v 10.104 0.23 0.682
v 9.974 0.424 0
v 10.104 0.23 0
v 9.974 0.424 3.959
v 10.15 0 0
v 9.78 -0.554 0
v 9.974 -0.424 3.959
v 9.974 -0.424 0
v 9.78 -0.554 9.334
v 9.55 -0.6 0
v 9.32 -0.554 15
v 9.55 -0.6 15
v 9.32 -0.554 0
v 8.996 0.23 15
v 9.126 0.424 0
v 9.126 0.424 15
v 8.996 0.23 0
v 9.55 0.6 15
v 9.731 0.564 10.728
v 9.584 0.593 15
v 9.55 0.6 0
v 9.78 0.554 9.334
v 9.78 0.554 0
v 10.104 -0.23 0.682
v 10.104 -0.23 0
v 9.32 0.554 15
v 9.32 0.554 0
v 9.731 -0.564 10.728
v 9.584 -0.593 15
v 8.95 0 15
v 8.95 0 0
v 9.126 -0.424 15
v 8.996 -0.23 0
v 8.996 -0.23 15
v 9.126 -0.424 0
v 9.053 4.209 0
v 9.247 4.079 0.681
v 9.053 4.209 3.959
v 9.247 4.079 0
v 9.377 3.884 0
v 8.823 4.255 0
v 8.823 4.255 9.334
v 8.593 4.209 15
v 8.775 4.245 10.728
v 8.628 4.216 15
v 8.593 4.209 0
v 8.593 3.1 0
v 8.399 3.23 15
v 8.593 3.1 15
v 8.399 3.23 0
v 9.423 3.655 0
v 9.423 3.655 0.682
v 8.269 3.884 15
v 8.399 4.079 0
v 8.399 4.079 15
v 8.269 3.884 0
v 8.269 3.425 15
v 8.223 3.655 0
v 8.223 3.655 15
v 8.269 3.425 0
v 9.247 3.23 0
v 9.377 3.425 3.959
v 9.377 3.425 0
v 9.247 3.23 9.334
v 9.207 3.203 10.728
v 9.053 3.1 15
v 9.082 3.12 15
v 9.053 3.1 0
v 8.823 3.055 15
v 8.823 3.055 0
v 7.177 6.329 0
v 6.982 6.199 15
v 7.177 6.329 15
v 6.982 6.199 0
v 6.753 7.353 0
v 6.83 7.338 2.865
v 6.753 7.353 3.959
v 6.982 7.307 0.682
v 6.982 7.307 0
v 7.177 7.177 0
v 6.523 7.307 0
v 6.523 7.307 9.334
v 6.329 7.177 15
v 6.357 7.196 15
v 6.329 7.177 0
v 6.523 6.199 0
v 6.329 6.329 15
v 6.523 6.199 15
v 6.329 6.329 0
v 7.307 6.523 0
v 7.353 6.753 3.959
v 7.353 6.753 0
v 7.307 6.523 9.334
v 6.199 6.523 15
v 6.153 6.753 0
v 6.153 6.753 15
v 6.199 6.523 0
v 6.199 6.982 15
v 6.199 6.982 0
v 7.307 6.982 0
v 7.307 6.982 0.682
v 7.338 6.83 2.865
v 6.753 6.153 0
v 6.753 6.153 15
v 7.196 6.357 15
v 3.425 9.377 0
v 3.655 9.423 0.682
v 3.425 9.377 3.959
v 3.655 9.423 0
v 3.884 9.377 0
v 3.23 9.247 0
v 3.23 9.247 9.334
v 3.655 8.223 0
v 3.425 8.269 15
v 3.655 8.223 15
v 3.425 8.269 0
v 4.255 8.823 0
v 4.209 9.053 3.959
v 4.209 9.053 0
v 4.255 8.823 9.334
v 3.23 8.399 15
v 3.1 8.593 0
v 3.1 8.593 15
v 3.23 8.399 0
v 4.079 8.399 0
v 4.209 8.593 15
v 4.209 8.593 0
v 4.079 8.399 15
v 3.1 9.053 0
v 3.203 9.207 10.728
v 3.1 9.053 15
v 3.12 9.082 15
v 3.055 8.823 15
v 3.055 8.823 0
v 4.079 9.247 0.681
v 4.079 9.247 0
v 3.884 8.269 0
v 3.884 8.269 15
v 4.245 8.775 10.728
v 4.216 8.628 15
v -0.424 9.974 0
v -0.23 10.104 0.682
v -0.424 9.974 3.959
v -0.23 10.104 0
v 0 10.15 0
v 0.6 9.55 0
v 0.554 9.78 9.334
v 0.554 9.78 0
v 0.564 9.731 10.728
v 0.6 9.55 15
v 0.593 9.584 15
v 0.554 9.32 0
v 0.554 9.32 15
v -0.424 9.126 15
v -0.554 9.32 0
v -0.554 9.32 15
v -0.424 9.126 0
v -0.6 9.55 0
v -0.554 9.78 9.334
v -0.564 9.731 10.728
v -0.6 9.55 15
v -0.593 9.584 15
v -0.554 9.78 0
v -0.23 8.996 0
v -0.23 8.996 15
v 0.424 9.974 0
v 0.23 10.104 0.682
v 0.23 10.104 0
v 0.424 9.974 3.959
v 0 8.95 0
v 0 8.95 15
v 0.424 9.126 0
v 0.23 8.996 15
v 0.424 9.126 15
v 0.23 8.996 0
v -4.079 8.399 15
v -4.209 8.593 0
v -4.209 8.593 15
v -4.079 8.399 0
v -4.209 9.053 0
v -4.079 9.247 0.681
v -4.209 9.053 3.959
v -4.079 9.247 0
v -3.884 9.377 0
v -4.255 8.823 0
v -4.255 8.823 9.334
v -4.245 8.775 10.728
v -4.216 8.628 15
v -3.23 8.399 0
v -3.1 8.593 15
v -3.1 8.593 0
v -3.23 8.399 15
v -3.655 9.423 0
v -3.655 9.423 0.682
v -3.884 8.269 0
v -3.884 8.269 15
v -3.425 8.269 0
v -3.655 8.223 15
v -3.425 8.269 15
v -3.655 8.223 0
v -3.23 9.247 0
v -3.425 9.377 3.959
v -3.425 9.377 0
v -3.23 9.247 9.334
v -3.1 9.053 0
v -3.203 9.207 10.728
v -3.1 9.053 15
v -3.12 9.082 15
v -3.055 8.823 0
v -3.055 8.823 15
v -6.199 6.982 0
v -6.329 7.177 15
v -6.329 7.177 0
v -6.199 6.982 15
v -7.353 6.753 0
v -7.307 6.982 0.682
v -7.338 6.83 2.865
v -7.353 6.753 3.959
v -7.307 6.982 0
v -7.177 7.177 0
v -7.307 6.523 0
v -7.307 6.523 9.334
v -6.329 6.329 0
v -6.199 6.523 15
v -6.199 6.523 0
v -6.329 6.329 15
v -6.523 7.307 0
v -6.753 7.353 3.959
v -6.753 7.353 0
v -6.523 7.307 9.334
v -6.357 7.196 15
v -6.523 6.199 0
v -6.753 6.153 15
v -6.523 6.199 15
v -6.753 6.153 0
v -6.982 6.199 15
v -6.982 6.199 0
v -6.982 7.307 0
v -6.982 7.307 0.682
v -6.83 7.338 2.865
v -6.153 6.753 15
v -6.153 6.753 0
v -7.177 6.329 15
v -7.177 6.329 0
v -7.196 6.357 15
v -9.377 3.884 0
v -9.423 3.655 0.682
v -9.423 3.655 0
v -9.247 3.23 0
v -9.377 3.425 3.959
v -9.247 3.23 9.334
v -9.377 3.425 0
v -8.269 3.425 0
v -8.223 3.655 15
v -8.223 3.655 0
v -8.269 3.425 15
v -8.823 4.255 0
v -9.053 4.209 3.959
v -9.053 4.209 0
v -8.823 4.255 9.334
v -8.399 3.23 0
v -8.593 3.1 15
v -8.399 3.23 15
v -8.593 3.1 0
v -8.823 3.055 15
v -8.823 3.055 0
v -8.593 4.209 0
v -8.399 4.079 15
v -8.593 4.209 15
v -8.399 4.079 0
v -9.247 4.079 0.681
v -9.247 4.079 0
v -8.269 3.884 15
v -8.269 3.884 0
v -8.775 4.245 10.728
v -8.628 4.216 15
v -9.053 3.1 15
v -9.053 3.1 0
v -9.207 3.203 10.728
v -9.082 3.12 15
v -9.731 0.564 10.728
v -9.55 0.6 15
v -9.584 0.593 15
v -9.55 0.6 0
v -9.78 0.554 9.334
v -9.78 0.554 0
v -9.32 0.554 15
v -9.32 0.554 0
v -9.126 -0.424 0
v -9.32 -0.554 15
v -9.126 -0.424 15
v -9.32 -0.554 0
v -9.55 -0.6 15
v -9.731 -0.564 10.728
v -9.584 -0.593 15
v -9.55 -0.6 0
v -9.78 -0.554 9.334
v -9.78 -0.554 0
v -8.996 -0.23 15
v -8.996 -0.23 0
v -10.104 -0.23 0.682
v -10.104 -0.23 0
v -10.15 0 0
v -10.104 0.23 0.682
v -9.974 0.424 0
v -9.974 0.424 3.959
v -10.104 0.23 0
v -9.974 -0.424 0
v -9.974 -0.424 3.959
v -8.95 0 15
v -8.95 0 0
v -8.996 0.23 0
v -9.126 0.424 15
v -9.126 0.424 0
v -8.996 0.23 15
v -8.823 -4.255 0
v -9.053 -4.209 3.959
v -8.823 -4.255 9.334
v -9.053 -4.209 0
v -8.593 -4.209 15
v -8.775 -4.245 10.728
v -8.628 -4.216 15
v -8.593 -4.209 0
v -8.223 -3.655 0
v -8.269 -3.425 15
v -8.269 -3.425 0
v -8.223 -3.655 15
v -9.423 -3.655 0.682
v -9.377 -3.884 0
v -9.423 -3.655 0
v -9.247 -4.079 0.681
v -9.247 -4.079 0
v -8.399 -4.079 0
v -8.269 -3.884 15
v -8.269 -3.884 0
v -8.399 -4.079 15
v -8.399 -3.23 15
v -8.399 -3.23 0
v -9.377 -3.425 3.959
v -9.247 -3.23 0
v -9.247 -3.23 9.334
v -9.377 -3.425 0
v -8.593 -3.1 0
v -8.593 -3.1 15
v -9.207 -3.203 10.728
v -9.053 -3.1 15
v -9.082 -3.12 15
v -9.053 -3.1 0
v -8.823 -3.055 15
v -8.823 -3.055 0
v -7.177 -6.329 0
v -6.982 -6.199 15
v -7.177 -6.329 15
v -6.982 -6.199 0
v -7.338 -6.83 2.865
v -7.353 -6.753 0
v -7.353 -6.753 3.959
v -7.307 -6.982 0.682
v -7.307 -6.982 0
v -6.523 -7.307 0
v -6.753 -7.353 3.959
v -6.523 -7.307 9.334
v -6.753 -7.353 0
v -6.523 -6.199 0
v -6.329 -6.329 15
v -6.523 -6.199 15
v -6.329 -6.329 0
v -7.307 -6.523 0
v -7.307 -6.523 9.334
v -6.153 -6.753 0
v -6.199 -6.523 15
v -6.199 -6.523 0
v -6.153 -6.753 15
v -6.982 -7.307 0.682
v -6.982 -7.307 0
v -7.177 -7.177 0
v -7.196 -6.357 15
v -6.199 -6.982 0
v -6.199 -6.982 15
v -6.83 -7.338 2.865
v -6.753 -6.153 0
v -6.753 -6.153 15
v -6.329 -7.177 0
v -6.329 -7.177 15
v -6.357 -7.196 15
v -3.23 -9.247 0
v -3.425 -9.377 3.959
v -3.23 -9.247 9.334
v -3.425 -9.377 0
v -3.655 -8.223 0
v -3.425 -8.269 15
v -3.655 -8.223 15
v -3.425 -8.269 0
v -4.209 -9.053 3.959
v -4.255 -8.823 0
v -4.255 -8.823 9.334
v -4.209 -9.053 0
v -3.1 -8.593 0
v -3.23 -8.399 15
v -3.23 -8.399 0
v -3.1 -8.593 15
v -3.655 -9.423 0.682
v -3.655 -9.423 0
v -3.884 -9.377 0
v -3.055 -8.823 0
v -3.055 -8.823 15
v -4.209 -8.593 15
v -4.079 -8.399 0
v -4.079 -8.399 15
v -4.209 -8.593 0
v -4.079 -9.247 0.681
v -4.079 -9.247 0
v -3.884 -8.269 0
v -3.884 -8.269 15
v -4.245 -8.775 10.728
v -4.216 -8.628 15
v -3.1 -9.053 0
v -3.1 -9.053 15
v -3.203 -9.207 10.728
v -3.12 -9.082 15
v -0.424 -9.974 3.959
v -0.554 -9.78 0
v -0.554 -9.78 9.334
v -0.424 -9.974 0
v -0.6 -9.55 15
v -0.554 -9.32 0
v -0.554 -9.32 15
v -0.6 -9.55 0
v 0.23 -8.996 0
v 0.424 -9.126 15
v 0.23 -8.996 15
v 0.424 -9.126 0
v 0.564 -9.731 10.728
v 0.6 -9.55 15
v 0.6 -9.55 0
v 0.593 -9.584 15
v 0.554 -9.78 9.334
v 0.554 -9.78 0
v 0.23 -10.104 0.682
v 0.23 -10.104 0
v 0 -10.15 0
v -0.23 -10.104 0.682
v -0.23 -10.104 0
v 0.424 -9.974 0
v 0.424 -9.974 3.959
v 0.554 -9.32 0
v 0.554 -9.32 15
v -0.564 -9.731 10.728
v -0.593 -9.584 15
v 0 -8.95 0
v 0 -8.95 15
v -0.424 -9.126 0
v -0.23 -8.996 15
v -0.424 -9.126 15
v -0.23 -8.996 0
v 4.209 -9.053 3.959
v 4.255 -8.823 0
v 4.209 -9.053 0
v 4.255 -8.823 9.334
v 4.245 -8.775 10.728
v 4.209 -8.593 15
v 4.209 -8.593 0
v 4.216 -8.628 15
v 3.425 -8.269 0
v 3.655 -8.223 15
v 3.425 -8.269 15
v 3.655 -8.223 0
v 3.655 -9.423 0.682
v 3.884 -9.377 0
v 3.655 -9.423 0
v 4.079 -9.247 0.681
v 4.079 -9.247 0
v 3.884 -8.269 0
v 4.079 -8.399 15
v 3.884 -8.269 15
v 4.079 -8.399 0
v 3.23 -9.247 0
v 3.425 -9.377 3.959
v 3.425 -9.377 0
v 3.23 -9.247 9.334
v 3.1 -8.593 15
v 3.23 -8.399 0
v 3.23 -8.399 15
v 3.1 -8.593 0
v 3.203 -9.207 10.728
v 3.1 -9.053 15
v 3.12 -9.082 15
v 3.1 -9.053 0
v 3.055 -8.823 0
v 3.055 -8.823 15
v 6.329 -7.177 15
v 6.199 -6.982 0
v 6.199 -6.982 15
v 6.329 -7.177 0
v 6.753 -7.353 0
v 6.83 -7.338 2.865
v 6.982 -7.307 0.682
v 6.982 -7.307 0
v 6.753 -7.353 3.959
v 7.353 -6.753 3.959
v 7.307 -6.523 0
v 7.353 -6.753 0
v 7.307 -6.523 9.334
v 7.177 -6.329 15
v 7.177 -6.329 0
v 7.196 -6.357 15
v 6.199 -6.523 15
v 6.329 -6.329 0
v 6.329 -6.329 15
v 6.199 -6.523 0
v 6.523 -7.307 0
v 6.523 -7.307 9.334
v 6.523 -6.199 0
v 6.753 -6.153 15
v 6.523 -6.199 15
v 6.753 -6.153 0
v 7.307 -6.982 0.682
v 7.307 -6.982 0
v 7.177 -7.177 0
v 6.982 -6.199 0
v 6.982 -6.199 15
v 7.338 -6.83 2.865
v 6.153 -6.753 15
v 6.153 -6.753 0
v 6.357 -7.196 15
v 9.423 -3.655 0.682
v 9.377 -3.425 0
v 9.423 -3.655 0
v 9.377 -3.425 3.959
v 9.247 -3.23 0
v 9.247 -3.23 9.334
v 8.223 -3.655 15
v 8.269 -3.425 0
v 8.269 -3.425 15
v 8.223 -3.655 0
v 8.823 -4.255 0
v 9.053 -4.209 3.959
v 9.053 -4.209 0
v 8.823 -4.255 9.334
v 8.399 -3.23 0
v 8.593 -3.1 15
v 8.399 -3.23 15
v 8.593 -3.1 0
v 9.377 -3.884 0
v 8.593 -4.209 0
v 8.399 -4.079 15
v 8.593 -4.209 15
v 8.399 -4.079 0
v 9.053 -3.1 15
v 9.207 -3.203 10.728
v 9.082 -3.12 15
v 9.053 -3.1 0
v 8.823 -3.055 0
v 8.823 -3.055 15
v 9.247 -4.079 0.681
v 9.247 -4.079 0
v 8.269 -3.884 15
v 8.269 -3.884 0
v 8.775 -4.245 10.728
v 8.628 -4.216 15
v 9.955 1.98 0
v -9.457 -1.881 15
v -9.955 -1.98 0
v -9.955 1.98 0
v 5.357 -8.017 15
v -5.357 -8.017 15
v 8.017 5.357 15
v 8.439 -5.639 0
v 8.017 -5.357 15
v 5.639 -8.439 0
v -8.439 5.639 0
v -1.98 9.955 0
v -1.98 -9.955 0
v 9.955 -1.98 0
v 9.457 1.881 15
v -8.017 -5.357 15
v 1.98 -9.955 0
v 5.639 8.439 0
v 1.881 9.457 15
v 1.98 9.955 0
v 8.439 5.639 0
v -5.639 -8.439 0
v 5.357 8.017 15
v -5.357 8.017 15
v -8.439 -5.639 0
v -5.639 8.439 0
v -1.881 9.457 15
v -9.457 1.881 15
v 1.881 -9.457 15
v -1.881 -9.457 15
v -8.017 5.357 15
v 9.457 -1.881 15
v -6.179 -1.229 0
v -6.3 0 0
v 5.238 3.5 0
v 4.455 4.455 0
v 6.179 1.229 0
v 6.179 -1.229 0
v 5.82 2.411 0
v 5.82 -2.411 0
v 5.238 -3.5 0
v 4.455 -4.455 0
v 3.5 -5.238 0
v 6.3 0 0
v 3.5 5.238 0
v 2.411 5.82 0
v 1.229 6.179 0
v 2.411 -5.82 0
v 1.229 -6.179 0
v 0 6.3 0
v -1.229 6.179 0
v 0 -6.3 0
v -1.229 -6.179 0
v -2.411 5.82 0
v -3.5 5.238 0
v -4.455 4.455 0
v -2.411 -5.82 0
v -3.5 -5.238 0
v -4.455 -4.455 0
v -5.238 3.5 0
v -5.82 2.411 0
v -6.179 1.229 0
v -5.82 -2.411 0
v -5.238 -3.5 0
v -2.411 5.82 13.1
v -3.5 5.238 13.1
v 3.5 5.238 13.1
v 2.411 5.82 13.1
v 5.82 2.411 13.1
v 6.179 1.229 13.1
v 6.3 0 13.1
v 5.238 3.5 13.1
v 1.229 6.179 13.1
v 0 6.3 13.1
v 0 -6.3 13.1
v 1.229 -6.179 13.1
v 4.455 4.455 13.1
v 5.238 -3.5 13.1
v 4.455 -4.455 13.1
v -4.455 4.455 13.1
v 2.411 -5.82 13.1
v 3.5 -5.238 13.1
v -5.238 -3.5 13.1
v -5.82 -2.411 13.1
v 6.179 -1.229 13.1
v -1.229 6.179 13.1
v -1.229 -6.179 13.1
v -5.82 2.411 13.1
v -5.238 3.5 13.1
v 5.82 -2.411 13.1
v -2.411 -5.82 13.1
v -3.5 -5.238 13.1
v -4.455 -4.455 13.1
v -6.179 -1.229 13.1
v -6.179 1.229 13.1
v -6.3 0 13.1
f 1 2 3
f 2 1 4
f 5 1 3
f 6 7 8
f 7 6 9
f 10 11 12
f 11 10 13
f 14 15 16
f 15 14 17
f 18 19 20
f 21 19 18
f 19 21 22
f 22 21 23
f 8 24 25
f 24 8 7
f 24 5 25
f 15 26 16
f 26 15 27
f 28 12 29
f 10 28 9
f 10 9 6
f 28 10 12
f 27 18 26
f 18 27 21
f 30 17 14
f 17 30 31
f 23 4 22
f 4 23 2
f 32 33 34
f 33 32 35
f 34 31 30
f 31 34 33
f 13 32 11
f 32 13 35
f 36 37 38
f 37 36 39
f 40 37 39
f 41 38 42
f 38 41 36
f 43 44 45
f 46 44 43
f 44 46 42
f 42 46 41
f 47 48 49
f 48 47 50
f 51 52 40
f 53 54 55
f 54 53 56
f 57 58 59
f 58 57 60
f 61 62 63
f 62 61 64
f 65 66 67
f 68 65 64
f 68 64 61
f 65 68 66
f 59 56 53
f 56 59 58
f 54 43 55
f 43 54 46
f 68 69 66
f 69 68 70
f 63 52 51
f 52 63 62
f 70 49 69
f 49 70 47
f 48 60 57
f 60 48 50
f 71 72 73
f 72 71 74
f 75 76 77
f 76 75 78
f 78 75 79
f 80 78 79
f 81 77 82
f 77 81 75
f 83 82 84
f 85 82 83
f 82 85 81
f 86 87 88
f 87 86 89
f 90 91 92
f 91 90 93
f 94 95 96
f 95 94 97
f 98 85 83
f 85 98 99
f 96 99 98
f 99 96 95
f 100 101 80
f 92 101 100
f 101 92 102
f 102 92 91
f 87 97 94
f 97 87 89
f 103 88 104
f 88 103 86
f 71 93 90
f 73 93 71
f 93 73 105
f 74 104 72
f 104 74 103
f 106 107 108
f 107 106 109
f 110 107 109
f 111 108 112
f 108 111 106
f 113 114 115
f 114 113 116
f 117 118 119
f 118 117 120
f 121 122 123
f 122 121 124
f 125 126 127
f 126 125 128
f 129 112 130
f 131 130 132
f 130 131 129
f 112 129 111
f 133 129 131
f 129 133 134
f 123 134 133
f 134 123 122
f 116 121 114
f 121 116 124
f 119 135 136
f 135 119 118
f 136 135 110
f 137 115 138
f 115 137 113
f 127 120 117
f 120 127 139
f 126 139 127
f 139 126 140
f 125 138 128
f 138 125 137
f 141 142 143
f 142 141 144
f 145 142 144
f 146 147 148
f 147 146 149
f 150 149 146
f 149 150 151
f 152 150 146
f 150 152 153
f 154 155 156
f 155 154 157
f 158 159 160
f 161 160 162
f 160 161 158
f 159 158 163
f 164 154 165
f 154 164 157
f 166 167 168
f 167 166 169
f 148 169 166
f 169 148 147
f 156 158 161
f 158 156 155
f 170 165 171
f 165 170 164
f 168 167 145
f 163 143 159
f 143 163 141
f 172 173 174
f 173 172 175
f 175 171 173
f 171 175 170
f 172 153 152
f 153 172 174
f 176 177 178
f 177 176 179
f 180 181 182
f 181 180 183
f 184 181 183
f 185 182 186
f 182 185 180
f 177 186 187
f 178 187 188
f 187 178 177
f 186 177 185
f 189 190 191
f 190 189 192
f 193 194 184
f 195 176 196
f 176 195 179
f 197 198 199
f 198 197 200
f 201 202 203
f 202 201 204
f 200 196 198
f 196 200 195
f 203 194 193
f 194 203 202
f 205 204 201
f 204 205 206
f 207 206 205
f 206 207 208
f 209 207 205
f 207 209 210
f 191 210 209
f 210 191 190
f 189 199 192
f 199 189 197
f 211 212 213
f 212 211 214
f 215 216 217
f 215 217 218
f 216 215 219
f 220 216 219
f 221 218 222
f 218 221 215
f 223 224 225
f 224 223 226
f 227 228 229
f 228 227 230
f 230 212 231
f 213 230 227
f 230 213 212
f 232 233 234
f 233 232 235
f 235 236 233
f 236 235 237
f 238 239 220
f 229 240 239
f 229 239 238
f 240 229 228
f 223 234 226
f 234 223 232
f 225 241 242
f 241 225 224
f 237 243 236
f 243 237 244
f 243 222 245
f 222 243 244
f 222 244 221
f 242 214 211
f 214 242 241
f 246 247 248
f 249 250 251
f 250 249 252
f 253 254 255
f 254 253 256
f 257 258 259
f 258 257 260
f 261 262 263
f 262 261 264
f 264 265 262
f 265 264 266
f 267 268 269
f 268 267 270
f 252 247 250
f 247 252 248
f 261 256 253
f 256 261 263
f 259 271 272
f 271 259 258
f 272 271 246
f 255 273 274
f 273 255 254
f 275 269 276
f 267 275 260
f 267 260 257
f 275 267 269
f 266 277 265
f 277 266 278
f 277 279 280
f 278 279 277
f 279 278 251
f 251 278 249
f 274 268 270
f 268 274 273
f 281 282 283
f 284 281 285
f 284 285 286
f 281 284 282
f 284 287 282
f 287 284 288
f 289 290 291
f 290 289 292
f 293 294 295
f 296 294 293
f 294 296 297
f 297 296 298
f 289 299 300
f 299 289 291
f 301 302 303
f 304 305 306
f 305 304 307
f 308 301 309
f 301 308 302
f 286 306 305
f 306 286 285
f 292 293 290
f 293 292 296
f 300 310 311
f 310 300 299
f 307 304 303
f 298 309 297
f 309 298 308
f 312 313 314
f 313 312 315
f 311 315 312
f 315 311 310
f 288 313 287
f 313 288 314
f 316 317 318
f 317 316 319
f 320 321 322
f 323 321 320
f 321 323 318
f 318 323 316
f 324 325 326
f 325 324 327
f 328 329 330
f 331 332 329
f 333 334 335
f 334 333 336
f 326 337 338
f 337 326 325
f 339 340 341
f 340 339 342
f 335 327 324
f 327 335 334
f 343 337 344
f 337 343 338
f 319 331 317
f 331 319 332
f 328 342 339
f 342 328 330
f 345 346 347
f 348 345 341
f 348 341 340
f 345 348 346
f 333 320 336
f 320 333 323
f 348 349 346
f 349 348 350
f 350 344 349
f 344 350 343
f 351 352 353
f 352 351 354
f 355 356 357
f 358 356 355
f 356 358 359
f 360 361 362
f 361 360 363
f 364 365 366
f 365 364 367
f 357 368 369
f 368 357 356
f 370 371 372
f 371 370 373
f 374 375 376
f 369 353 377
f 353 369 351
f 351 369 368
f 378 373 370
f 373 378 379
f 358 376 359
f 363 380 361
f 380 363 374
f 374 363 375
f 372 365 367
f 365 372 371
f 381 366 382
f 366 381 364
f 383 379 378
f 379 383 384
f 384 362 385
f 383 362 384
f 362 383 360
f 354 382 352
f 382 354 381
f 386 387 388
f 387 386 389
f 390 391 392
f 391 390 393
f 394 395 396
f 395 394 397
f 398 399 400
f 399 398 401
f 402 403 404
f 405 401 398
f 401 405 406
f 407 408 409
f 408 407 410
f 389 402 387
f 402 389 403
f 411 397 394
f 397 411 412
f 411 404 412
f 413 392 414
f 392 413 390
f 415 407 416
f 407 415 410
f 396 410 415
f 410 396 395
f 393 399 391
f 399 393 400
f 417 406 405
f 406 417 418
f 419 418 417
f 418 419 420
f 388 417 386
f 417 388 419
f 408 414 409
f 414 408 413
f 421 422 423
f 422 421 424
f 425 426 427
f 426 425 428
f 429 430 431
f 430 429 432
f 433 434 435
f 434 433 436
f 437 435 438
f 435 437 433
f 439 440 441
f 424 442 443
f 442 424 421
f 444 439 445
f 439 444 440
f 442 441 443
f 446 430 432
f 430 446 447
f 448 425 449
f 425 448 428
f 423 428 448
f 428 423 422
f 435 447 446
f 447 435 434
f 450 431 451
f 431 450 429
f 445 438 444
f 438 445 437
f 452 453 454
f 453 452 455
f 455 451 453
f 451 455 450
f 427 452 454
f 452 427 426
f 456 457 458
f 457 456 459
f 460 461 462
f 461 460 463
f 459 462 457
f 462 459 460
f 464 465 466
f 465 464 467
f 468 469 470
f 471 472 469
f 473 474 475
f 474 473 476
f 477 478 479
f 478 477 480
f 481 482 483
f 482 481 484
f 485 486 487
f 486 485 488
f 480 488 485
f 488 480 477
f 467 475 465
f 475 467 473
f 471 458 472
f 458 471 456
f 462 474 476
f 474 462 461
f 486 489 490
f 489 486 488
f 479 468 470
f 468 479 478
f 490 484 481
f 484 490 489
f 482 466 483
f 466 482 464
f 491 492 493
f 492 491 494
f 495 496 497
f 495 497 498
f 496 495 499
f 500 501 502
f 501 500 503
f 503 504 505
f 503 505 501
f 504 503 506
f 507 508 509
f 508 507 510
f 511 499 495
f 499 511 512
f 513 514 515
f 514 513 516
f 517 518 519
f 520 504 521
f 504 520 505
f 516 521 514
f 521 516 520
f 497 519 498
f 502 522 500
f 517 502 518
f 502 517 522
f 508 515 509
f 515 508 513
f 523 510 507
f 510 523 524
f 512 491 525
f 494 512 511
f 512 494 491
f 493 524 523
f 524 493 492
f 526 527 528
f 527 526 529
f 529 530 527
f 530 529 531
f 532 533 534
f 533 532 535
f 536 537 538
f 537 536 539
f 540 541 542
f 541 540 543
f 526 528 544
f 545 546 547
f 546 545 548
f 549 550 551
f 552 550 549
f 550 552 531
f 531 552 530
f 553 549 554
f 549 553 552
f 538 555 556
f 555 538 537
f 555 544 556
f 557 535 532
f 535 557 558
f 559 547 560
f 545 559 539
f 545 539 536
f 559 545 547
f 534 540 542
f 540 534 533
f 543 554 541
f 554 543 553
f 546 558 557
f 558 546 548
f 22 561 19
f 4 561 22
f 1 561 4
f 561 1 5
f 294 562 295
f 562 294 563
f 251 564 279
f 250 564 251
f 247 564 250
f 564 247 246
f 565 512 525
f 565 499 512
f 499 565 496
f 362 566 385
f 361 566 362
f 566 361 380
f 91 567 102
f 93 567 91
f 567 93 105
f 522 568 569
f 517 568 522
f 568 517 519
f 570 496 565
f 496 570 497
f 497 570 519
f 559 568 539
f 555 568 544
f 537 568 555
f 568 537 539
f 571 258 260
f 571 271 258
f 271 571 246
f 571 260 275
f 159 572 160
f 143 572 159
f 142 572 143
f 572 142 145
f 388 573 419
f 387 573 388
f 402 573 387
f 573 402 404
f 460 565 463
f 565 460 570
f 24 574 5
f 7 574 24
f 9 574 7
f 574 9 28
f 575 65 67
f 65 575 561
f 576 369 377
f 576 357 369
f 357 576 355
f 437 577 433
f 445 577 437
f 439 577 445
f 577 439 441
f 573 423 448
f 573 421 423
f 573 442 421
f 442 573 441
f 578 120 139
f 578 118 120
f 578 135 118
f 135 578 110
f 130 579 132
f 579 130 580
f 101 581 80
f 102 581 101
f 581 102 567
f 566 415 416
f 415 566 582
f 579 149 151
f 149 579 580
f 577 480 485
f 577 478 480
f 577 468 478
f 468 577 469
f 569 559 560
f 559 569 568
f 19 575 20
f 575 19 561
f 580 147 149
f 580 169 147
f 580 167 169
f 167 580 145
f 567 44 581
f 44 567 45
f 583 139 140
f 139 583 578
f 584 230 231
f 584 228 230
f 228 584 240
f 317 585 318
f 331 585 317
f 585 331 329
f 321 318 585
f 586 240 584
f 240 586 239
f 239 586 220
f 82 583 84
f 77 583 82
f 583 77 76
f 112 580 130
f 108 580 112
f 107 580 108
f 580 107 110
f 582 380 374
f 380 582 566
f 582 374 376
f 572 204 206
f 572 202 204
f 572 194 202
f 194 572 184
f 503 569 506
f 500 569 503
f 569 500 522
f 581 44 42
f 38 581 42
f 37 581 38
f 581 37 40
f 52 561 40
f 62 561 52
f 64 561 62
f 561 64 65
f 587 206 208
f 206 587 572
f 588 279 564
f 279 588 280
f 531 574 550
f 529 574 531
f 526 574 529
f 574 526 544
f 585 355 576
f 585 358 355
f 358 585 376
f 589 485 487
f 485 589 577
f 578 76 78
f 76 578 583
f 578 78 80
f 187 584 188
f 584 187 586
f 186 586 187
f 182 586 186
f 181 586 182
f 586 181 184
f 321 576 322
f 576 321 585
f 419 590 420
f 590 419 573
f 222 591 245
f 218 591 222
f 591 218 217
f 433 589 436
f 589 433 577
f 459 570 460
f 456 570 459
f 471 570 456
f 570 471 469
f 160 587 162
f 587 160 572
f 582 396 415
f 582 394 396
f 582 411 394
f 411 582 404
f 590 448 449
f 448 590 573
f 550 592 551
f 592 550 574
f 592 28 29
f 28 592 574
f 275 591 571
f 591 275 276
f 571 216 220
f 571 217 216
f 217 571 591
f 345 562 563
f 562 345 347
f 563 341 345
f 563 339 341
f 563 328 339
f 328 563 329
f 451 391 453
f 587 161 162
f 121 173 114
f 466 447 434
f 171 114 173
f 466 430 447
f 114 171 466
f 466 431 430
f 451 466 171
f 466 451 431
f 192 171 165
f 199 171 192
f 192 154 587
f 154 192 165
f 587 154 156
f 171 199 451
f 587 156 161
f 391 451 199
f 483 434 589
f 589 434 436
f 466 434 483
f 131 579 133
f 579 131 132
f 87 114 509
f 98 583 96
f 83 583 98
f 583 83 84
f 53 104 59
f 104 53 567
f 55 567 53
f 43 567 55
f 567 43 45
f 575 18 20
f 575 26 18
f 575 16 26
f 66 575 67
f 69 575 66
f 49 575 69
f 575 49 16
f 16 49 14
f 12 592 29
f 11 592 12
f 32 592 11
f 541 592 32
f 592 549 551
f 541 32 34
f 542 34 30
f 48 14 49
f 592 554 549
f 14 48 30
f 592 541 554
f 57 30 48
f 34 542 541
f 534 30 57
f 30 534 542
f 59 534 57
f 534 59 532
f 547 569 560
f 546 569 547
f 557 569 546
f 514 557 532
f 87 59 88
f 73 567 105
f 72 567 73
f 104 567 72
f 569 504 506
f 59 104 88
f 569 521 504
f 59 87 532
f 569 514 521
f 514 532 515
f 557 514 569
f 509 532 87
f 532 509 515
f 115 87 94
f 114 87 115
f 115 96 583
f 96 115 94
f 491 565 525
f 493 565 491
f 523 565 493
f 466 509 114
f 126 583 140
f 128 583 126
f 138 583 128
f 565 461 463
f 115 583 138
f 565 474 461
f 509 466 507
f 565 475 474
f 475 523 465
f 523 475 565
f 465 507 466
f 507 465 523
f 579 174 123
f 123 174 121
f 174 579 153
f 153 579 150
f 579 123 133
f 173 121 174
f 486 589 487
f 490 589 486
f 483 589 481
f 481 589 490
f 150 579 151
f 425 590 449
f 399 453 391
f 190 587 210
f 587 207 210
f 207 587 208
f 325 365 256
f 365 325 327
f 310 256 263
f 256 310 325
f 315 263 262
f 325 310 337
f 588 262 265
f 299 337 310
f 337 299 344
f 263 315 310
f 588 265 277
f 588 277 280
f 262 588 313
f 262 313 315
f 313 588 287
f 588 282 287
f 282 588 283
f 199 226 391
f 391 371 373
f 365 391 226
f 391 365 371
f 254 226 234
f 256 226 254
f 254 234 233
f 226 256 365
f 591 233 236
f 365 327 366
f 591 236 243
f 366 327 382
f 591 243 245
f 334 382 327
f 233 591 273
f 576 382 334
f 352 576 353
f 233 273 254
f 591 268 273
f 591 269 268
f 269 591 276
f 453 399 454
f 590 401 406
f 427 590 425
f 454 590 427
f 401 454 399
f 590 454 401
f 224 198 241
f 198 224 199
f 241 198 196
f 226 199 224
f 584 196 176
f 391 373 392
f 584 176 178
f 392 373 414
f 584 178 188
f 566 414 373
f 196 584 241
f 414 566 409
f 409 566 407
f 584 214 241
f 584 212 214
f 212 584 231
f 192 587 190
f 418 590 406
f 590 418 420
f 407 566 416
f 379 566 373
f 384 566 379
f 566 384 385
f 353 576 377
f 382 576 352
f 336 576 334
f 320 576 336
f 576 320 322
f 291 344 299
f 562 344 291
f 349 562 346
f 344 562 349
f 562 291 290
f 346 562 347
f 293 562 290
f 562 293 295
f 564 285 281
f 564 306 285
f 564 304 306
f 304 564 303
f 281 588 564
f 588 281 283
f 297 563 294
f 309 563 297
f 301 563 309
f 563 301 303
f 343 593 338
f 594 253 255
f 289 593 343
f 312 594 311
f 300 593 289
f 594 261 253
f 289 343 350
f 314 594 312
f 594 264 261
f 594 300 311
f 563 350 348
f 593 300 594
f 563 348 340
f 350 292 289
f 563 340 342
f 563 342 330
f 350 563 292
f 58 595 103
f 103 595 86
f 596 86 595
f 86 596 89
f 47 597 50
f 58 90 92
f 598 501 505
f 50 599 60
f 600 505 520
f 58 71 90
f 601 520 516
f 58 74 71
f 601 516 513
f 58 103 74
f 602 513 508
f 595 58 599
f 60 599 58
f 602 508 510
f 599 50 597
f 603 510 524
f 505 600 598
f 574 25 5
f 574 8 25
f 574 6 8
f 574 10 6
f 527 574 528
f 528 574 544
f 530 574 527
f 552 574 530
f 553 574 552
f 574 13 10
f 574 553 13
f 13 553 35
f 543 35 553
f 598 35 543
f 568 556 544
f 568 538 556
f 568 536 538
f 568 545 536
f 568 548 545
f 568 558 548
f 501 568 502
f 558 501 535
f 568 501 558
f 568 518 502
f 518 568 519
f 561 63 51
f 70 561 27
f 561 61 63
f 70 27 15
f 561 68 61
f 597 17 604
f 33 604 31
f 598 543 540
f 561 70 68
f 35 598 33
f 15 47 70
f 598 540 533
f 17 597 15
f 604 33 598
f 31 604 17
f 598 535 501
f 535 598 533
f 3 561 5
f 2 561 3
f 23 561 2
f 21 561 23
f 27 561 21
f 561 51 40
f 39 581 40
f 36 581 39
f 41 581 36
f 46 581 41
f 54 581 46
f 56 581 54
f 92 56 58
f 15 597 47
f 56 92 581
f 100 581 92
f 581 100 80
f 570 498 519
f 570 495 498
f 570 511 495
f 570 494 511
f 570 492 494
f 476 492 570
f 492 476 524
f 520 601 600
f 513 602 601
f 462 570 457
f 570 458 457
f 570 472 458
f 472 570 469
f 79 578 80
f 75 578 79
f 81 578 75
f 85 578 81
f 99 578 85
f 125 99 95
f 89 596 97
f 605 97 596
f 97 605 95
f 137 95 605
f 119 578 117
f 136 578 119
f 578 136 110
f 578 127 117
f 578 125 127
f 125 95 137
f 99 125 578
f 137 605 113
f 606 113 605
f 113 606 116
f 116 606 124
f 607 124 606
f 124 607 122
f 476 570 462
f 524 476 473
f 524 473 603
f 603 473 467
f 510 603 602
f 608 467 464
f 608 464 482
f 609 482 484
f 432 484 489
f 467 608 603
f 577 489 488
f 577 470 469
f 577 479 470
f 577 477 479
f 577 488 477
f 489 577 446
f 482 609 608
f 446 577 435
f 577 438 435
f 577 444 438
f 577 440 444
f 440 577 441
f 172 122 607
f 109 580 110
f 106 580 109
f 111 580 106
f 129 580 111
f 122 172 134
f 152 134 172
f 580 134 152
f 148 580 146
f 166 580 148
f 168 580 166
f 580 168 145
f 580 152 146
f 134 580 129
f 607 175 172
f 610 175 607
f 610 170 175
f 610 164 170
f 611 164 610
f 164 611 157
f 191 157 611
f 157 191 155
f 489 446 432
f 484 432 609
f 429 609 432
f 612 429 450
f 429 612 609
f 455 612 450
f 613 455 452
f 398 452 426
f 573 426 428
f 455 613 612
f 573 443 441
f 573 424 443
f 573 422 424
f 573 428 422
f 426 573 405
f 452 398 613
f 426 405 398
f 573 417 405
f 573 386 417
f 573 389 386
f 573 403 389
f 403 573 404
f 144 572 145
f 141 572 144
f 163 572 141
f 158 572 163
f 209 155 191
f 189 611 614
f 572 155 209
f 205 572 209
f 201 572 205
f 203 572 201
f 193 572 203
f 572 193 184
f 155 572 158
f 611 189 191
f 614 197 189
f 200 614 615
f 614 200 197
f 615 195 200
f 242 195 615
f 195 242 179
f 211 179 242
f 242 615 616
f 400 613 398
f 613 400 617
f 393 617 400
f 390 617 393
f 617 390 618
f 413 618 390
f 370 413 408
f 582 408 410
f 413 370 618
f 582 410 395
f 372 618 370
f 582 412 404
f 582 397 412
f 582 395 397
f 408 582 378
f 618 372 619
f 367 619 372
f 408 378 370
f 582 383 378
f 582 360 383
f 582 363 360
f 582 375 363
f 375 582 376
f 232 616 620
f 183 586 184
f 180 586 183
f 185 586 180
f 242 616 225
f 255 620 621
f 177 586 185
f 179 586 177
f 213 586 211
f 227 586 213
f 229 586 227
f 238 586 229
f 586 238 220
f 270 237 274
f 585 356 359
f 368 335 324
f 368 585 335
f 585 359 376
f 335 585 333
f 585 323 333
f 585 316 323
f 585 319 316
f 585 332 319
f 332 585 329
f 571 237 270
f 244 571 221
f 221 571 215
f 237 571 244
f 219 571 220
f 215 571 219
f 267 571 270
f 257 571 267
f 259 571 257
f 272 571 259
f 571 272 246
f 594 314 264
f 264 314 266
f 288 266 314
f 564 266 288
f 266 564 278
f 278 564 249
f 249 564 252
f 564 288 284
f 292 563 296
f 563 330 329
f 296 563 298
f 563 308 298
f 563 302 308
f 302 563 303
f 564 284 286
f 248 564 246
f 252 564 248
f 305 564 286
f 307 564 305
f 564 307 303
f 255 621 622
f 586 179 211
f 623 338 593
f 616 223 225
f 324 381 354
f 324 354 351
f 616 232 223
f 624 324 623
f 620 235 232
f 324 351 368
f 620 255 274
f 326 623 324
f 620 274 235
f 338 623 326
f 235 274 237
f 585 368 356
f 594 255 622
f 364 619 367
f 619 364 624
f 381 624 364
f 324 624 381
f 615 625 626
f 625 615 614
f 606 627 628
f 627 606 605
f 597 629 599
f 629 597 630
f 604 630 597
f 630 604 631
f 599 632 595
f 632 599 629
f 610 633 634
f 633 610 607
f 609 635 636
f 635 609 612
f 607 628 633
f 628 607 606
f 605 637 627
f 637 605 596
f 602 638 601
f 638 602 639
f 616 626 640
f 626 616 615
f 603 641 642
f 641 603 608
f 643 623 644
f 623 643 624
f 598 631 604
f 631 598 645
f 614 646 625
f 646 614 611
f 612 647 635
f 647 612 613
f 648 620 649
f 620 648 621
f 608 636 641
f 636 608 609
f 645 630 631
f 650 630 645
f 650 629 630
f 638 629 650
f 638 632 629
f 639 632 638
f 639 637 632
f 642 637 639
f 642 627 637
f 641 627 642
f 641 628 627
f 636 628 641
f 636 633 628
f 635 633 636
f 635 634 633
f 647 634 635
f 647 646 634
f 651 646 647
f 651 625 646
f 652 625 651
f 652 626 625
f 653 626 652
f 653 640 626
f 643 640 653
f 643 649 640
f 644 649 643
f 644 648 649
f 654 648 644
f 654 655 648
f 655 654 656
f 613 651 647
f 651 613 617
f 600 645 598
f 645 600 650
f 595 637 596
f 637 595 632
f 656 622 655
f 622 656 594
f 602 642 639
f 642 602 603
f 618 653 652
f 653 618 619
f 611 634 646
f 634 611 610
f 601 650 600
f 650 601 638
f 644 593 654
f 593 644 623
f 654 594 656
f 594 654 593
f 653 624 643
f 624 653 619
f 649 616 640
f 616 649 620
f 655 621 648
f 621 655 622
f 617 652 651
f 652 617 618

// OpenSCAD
// ACCESS KNOB — Elektron Machinedrum / Monomachine Master & Vol Knob (Slip-On Sleeve)
// Generated via CLI for Studio Knobs (Slip-On Sleeve)
module access_knob_elektron_master_slipon() {
  outer_d = 20.3;
  height = 15;
  taper = 0.95;
  bore_d = 12.3;
  slot_h = 13;
  tex_depth = 1.2;
  tex_scale = 1.2;
  tex_count = 16;

  difference() {
    cylinder(h=height, d1=outer_d, d2=outer_d*taper, $fn=32);
    translate([0,0,-0.1]) cylinder(h=slot_h+0.2, d=bore_d + 0.3, $fn=32);
    for(i=[0:tex_count-1]) {
      rotate([0,0,i*(360/tex_count)])
        translate([outer_d/2-tex_depth/2, 0, height/2])
          cylinder(h=height*1.1, d=tex_scale, center=true, $fn=16);
    }
  }
}
access_knob_elektron_master_slipon();
